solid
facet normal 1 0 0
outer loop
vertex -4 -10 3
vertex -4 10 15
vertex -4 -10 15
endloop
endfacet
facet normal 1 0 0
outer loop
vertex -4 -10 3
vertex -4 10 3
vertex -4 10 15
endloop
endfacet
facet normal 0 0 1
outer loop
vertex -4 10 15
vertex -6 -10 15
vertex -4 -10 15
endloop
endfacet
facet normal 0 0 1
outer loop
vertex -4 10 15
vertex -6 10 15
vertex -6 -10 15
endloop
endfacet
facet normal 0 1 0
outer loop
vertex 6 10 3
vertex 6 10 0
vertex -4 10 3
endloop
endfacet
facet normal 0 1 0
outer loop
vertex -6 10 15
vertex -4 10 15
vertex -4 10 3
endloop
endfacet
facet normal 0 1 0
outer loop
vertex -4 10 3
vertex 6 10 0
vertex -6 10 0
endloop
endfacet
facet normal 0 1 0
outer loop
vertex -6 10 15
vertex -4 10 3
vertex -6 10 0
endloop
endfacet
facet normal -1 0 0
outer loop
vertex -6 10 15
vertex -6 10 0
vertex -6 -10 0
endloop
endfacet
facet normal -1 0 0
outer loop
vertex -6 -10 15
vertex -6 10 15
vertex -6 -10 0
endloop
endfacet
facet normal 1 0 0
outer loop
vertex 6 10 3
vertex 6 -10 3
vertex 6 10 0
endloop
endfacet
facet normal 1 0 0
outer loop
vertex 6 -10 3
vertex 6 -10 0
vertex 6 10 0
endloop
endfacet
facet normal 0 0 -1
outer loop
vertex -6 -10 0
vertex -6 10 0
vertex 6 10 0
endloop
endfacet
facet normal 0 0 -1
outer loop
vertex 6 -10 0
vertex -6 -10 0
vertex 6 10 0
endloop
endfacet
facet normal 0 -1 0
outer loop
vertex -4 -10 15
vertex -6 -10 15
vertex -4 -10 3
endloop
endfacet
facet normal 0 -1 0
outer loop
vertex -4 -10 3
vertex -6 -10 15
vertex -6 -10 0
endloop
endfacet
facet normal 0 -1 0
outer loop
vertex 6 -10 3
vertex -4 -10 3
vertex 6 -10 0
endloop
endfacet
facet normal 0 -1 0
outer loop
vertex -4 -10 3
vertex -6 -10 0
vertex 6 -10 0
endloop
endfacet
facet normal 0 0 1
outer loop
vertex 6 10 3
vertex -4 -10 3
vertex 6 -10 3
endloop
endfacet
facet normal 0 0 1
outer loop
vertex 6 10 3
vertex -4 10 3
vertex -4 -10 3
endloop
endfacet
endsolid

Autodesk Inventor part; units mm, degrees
ref_plane "YZ Plane" through (0, 0, 0) normal (1, 0, 0) x (0, 1, 0)
ref_plane "XZ Plane" through (0, 0, 0) normal (0, 1, 0) x (-1, 0, 0)
ref_plane "XY Plane" through (0, 0, 0) normal (0, 0, 1) x (1, 0, 0)
sketch "Sketch1" plane through (0, 0, 0) normal (0, 0, 1) x (1, 0, 0)
  line L0 (6, -10) -> (6, 10) projected
  line L1 (6, 10) -> (-6, 10) projected
  line L2 (-6, 10) -> (-6, -10) projected
  line L3 (-6, -10) -> (6, -10) projected
  point P0 (0, 0)
extrude "Extrusion1" add sketch "Sketch1" along normal blind 3
sketch "Sketch2" plane through (0, 0, 3) normal (0, 0, 1) x (1, 0, 0)
  line L0 (6, 10) -> (-6, 10) projected
  line L1 (-6, 10) -> (-6, -10) projected
  line L2 (-6, -10) -> (6, -10) projected
  line L3 (-6, 10) -> (-4, 10)
  line L4 (-4, 10) -> (-4, -10)
  line L5 (-6, -10) -> (-6, 10)
  point P0 (0, 0)
  dimension "d2" = 2
extrude "Extrusion2" add sketch "Sketch2" along normal blind 12
properties part number "commutator_attatchment_pulley_bridge"
